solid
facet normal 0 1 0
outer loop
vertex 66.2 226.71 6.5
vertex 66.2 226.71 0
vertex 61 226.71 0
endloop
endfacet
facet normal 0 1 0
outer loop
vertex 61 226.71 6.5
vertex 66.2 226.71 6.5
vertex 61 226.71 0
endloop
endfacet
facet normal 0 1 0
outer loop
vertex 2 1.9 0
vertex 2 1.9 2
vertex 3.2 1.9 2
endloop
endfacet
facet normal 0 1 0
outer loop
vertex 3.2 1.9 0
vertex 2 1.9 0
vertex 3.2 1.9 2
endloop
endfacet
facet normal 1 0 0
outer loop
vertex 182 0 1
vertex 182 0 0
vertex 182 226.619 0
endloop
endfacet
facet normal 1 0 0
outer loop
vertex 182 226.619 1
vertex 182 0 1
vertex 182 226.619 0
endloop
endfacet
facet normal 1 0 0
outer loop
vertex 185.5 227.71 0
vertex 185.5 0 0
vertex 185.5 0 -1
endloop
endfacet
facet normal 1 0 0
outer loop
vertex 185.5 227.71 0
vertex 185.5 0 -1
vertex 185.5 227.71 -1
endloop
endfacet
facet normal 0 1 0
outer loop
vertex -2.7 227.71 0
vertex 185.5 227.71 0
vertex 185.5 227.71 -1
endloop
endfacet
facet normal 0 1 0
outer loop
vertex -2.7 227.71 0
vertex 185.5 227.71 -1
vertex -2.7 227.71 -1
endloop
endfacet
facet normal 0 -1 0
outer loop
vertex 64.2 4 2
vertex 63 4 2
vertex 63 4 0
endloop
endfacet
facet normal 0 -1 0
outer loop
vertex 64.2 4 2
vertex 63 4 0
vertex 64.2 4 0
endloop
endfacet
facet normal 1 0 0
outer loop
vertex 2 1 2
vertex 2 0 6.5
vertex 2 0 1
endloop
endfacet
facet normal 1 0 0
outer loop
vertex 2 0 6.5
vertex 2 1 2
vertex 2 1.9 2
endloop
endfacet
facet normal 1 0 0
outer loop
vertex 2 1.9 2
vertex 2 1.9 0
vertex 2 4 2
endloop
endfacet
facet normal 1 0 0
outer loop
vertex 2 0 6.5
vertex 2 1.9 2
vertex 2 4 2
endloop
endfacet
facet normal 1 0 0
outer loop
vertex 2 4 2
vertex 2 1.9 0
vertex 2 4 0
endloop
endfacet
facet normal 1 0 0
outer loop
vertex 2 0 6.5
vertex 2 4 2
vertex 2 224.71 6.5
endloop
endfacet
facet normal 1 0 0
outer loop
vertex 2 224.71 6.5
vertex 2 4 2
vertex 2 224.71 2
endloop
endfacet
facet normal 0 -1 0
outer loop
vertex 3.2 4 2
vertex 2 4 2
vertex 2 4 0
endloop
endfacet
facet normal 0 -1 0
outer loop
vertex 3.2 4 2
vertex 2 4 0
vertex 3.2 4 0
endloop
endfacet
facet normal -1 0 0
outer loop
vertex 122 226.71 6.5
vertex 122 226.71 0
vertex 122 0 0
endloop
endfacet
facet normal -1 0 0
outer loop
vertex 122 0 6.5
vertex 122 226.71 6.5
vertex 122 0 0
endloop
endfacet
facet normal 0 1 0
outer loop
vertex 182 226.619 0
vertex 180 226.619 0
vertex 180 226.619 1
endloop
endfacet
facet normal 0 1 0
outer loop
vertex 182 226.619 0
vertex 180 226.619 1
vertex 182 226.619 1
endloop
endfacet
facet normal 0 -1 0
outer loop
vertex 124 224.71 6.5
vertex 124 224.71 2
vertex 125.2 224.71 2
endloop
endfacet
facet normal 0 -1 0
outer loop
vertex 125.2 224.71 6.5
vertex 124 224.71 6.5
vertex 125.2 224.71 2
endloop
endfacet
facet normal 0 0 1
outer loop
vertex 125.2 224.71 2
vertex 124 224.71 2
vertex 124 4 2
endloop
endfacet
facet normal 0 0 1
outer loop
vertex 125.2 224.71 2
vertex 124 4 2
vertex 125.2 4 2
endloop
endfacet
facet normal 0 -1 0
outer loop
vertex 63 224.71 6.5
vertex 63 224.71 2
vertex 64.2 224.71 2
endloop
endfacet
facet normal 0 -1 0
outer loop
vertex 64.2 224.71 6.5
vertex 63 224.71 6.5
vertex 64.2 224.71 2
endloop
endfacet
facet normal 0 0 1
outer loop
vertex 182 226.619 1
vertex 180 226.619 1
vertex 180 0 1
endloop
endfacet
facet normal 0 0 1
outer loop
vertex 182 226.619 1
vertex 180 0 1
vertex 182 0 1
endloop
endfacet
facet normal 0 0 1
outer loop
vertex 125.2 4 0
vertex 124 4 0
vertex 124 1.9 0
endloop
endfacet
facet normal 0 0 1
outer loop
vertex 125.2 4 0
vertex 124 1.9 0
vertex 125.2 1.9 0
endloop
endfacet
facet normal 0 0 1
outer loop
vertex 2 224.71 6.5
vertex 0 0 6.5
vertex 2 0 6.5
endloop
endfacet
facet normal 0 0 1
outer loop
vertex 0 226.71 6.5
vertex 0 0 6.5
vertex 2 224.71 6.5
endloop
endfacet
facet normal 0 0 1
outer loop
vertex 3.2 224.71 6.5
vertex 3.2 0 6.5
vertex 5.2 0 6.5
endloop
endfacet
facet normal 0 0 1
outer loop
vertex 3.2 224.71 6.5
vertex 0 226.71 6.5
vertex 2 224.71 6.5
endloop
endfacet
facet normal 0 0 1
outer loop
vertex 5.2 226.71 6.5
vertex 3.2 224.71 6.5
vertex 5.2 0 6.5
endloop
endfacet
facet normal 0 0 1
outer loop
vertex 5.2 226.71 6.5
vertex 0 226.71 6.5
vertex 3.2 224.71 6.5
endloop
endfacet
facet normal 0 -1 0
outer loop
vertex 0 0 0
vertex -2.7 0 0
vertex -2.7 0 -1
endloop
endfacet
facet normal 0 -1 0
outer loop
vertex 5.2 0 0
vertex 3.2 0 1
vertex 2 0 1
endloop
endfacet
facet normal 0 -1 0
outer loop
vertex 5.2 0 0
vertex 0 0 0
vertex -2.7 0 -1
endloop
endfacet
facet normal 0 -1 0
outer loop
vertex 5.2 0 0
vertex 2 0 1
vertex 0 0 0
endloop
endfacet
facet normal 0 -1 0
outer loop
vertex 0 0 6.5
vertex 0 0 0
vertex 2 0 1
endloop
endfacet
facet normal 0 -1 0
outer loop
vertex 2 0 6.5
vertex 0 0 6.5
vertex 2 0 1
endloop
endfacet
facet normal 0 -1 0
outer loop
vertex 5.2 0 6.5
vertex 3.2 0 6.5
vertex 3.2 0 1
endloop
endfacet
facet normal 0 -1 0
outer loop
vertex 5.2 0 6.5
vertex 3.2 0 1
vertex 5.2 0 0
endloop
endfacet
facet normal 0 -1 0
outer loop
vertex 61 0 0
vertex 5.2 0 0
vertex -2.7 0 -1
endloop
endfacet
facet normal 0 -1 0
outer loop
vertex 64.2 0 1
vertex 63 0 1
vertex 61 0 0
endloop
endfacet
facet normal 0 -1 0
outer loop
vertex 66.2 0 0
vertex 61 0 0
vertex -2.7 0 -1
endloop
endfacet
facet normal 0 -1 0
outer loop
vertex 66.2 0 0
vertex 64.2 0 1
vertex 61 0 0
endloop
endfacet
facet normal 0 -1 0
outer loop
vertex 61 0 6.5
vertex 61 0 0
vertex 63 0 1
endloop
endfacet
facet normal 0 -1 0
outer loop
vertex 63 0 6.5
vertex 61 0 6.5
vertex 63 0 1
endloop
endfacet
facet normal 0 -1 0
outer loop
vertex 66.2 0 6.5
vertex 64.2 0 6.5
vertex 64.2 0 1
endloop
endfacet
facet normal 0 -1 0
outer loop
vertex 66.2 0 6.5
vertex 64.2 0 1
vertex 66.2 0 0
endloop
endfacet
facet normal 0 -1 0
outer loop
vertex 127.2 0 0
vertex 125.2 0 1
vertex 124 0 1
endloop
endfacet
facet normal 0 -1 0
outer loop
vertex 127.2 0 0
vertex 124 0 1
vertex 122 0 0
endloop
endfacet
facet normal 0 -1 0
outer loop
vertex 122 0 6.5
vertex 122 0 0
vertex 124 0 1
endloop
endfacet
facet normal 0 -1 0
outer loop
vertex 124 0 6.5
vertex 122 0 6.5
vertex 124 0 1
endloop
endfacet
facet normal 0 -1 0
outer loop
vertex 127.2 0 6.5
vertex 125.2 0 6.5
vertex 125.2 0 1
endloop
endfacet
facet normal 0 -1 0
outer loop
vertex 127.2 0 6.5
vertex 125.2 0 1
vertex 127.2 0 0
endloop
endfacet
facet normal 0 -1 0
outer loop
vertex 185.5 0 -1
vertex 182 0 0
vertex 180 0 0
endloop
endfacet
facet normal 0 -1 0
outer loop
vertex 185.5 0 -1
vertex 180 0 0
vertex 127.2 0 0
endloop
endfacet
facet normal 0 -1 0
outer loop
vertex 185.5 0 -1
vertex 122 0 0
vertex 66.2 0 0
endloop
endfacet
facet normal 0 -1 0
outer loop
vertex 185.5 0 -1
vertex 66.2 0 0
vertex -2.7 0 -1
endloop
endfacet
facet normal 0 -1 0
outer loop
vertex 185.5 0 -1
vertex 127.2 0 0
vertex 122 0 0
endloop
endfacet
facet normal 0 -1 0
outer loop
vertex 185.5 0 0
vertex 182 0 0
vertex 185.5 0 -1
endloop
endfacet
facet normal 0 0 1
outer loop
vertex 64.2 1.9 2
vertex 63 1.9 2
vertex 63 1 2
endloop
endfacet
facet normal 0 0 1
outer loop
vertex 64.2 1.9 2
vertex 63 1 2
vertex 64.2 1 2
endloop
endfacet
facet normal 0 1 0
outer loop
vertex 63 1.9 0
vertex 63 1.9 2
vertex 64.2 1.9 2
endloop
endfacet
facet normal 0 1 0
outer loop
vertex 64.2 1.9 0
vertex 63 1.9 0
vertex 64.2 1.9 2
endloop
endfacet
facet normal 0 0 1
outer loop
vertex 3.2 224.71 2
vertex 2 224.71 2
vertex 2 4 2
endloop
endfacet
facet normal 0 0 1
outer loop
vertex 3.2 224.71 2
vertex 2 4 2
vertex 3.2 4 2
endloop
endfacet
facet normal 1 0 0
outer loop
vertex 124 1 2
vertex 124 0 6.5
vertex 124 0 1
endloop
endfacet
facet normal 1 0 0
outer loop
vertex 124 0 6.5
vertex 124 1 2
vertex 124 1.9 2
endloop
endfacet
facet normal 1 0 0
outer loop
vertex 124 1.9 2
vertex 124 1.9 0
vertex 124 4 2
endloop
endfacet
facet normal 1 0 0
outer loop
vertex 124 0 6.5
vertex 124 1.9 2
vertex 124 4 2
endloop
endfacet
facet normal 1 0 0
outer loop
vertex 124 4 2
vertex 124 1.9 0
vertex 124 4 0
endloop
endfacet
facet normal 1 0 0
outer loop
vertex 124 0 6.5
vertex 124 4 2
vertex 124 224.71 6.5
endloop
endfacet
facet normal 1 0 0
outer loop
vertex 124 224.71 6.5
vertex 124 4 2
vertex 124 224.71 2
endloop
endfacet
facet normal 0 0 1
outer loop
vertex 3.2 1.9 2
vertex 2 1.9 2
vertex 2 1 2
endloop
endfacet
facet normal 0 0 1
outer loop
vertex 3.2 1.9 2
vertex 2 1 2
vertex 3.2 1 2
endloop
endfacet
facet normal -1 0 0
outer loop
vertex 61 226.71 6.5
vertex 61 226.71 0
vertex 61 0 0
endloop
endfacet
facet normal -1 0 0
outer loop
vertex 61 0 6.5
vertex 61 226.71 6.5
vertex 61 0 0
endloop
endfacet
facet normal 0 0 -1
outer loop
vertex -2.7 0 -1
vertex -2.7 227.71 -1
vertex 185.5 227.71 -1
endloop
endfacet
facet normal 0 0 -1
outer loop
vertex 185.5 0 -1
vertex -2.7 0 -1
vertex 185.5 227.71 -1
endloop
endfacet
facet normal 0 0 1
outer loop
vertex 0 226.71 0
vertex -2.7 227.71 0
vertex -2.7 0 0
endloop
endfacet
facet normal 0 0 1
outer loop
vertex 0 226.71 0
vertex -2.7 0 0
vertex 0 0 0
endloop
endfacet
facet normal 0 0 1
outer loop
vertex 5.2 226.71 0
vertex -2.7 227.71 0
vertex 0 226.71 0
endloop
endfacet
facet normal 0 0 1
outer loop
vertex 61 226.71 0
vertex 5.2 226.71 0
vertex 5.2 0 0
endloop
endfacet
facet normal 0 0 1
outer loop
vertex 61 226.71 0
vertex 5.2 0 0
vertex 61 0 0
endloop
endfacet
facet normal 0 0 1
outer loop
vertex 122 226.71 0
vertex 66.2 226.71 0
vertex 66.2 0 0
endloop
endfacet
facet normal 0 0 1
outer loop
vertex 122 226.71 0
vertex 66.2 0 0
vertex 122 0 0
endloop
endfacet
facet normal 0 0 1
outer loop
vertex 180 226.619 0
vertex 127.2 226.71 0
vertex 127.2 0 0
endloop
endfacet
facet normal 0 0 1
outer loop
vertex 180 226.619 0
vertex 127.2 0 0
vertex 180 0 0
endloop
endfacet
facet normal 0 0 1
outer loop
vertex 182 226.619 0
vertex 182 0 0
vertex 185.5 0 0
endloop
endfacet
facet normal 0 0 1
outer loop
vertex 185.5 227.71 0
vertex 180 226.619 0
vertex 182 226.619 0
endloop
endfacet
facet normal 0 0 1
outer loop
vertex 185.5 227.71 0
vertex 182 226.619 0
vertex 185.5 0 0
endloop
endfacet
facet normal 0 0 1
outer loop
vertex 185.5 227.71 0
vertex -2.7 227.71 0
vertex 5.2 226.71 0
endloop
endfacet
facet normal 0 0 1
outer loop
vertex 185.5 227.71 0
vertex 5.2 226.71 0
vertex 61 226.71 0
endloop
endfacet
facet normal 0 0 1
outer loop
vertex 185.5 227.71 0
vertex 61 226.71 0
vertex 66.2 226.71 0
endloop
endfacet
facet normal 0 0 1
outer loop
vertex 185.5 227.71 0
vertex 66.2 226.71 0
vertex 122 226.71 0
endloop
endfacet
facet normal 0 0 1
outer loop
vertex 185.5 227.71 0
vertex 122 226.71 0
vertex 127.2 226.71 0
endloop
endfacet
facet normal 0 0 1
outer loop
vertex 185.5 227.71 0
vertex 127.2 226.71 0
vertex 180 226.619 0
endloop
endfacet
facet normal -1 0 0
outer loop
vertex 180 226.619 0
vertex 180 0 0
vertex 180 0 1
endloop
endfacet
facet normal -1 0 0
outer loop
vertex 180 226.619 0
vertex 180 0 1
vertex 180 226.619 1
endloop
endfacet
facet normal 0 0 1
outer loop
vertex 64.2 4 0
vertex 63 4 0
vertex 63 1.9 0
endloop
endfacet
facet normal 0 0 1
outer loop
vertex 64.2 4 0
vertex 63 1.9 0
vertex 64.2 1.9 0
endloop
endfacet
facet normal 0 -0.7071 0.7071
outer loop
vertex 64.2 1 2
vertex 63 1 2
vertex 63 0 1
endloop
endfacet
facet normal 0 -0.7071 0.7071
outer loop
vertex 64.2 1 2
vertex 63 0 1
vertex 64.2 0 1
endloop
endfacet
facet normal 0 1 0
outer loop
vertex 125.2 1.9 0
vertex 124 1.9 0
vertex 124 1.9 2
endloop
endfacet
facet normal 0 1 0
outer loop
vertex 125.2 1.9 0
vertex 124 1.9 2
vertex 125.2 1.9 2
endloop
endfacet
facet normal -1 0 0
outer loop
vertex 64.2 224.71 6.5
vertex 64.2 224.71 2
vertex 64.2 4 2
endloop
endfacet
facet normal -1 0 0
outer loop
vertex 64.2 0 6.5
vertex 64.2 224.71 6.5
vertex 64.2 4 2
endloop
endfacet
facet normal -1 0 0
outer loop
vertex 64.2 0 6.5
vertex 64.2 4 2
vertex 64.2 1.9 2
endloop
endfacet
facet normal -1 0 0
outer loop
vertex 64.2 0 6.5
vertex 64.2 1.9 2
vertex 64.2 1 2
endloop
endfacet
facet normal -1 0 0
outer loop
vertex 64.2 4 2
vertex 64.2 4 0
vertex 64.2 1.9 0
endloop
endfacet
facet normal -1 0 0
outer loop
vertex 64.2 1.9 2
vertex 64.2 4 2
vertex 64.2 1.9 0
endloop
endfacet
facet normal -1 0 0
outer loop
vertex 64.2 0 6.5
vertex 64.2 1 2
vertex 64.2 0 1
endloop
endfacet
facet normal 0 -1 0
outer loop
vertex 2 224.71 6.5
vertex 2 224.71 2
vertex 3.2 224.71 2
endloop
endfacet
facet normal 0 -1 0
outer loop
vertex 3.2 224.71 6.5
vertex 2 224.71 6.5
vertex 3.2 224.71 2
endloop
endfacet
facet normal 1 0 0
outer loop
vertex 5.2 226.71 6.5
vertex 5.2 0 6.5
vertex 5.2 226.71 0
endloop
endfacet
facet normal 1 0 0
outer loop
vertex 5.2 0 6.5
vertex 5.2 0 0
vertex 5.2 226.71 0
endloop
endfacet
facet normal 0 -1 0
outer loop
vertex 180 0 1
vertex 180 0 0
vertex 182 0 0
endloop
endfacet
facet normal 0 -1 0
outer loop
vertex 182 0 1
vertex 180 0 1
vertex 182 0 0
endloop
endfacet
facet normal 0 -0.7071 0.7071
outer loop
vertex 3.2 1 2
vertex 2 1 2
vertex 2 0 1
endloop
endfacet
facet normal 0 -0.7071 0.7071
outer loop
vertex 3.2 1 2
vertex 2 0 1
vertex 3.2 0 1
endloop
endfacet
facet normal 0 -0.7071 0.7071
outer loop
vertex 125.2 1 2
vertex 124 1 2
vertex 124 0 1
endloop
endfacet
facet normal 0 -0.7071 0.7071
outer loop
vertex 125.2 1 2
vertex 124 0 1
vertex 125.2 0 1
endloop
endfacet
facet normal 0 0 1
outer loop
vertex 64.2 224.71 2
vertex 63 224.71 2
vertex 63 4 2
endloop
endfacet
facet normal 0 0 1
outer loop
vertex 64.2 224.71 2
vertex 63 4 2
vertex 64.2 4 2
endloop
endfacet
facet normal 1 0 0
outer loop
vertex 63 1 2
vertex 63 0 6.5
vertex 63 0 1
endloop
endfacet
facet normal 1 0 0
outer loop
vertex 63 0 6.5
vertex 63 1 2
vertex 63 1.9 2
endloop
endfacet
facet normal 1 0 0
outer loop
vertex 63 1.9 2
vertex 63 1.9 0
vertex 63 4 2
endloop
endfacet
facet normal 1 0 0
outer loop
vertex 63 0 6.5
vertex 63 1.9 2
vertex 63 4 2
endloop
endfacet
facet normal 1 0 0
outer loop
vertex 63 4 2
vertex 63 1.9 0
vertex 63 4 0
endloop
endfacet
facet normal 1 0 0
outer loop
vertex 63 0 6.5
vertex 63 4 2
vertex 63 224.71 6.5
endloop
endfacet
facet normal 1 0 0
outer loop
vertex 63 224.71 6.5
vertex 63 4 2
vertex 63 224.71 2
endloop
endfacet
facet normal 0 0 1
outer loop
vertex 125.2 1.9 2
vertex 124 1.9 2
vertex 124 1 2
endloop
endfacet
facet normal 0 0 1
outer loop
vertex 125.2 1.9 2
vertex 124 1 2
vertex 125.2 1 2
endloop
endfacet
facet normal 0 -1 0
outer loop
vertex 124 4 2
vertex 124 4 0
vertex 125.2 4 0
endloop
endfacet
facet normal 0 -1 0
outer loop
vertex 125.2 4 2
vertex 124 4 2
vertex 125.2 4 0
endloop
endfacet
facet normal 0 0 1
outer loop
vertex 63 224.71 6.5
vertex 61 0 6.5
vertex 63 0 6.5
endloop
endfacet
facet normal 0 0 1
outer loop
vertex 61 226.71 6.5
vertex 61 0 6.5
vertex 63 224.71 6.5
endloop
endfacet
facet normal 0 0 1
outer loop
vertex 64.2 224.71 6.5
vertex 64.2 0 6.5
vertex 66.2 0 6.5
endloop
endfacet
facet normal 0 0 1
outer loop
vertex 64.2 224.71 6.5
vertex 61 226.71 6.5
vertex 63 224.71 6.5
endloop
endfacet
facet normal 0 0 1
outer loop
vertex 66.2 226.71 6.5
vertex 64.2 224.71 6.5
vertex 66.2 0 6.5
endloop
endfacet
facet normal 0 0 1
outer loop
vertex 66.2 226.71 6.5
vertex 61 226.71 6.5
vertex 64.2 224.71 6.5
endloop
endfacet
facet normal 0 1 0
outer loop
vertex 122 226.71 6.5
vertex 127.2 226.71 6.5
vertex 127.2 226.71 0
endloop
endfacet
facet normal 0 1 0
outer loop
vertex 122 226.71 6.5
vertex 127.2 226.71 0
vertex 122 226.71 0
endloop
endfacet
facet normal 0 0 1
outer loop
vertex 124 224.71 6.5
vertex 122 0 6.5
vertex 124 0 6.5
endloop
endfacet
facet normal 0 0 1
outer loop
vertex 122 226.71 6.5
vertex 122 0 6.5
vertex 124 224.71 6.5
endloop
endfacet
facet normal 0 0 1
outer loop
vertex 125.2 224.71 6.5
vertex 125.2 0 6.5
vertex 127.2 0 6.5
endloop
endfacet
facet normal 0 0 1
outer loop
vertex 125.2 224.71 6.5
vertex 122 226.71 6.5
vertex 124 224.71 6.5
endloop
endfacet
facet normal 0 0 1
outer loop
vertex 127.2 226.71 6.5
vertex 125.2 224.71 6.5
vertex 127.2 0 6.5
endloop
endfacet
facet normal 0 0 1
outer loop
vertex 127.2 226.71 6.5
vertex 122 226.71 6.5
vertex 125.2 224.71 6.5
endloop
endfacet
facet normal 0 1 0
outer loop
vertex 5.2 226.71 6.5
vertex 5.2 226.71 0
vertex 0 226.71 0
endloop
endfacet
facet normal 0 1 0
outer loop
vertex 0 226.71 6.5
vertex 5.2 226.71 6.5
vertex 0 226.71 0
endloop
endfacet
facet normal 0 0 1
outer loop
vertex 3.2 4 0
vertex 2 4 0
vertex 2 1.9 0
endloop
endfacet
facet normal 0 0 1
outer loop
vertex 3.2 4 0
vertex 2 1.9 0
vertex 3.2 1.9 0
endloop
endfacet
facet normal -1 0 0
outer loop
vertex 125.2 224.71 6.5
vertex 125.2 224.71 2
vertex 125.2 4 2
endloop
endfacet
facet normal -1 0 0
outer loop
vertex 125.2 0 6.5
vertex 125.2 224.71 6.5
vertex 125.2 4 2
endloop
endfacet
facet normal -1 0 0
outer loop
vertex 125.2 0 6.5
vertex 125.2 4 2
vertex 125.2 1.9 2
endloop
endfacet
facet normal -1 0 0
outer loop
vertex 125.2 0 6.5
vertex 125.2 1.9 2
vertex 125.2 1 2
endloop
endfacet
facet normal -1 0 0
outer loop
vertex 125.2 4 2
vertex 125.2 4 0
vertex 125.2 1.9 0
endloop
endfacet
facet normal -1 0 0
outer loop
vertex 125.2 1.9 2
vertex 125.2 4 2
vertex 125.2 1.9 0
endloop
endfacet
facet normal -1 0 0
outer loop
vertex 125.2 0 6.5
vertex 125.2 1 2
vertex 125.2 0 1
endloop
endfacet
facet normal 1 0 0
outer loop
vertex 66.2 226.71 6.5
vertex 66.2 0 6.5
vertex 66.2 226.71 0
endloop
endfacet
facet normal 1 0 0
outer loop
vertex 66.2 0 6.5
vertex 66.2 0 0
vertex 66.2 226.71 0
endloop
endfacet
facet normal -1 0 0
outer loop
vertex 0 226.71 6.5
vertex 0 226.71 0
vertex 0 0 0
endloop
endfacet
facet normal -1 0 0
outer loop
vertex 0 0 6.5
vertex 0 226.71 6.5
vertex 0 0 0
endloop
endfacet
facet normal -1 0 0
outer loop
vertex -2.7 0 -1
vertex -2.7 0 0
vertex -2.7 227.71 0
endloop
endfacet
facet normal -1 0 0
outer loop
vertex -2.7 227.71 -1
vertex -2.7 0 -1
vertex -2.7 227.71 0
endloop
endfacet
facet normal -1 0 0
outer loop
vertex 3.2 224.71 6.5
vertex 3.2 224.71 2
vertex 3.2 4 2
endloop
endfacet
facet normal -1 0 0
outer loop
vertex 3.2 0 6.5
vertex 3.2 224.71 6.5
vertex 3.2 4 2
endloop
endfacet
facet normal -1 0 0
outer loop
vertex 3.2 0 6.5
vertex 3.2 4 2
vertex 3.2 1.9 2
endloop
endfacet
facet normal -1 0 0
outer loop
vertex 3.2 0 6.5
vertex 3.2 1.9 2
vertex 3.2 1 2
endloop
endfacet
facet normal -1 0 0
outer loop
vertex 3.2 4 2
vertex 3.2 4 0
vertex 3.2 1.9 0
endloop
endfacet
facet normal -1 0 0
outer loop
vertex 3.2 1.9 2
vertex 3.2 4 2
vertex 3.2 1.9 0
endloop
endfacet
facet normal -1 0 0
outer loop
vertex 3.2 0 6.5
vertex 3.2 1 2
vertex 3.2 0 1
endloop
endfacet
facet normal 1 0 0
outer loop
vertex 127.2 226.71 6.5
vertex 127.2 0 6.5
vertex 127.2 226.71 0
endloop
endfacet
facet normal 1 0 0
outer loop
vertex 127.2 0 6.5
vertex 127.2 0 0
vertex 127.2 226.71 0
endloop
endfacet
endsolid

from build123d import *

# Parameters (mm, degrees)
F0_W     = 5.2
F0_H     = 226.71
F1_DEPTH = 2
F3_DEPTH = 4.5
F4_W     = 1.2
F4_H     = 2.1
F5_DEPTH = 25
F6_W     = 185.5
F6_H     = 227.71
F6_W_2   = 2.7
F7_DEPTH = 1
F8_W     = 2
F8_H     = 226.618603
F9_DEPTH = 1
F10_SIZE = 1


with BuildPart() as f1:
    # F0 (on Top) → F1 (new body)
    with BuildSketch(Plane.XY):
        with Locations((2.6, 113.355)):
            Rectangle(F0_W, F0_H)
        with Locations((63.6, 113.355)):
            Rectangle(F0_W, F0_H)
        with Locations((124.6, 113.355)):
            Rectangle(F0_W, F0_H)
    extrude(amount=F1_DEPTH)

    # F2 (on face) → F3 (join)
    with BuildSketch(Plane.XY.offset(2)):
        Polygon((0, 226.71), (0, 0), (2, 0), (2, 224.71), (3.2, 224.71), (3.2, 0), (5.2, 0), (5.2, 226.71), align=None)
        Polygon((61, 226.71), (61, 0), (63, 0), (63, 224.71), (64.2, 224.71), (64.2, 0), (66.2, 0), (66.2, 226.71), align=None)
        Polygon((122, 226.71), (122, 0), (124, 0), (124, 224.71), (125.2, 224.71), (125.2, 0), (127.2, 0), (127.2, 226.71), align=None)
    extrude(amount=F3_DEPTH)

    # F4 (on face) → F5 (cut)
    with BuildSketch(Plane.XY.offset(2)):
        with Locations((2.6, 2.95)):
            Rectangle(F4_W, F4_H)
        with Locations((63.6, 2.95)):
            Rectangle(F4_W, F4_H)
        with Locations((124.6, 2.95)):
            Rectangle(F4_W, F4_H)
    extrude(amount=-F5_DEPTH, mode=Mode.SUBTRACT)

    # F6 (on Top) → F7 (join)
    with BuildSketch(Plane.XY):
        with Locations((92.75, 113.855)):
            Rectangle(F6_W, F6_H)
        with Locations((-1.35, 113.855)):
            Rectangle(F6_W_2, F6_H)
    extrude(amount=-F7_DEPTH)

    # F8 (on face) → F9 (join)
    with BuildSketch(Plane.XY):
        with Locations((181, 113.309301)):
            Rectangle(F8_W, F8_H)
    extrude(amount=F9_DEPTH)

    # F10
    f10_edges = [f1.edges().sort_by_distance(p)[0] for p in [
        (2.6, 0, 2),
        (63.6, 0, 2),
        (124.6, 0, 2),
    ]]
    chamfer(f10_edges, length=F10_SIZE)


solid = f1.part
